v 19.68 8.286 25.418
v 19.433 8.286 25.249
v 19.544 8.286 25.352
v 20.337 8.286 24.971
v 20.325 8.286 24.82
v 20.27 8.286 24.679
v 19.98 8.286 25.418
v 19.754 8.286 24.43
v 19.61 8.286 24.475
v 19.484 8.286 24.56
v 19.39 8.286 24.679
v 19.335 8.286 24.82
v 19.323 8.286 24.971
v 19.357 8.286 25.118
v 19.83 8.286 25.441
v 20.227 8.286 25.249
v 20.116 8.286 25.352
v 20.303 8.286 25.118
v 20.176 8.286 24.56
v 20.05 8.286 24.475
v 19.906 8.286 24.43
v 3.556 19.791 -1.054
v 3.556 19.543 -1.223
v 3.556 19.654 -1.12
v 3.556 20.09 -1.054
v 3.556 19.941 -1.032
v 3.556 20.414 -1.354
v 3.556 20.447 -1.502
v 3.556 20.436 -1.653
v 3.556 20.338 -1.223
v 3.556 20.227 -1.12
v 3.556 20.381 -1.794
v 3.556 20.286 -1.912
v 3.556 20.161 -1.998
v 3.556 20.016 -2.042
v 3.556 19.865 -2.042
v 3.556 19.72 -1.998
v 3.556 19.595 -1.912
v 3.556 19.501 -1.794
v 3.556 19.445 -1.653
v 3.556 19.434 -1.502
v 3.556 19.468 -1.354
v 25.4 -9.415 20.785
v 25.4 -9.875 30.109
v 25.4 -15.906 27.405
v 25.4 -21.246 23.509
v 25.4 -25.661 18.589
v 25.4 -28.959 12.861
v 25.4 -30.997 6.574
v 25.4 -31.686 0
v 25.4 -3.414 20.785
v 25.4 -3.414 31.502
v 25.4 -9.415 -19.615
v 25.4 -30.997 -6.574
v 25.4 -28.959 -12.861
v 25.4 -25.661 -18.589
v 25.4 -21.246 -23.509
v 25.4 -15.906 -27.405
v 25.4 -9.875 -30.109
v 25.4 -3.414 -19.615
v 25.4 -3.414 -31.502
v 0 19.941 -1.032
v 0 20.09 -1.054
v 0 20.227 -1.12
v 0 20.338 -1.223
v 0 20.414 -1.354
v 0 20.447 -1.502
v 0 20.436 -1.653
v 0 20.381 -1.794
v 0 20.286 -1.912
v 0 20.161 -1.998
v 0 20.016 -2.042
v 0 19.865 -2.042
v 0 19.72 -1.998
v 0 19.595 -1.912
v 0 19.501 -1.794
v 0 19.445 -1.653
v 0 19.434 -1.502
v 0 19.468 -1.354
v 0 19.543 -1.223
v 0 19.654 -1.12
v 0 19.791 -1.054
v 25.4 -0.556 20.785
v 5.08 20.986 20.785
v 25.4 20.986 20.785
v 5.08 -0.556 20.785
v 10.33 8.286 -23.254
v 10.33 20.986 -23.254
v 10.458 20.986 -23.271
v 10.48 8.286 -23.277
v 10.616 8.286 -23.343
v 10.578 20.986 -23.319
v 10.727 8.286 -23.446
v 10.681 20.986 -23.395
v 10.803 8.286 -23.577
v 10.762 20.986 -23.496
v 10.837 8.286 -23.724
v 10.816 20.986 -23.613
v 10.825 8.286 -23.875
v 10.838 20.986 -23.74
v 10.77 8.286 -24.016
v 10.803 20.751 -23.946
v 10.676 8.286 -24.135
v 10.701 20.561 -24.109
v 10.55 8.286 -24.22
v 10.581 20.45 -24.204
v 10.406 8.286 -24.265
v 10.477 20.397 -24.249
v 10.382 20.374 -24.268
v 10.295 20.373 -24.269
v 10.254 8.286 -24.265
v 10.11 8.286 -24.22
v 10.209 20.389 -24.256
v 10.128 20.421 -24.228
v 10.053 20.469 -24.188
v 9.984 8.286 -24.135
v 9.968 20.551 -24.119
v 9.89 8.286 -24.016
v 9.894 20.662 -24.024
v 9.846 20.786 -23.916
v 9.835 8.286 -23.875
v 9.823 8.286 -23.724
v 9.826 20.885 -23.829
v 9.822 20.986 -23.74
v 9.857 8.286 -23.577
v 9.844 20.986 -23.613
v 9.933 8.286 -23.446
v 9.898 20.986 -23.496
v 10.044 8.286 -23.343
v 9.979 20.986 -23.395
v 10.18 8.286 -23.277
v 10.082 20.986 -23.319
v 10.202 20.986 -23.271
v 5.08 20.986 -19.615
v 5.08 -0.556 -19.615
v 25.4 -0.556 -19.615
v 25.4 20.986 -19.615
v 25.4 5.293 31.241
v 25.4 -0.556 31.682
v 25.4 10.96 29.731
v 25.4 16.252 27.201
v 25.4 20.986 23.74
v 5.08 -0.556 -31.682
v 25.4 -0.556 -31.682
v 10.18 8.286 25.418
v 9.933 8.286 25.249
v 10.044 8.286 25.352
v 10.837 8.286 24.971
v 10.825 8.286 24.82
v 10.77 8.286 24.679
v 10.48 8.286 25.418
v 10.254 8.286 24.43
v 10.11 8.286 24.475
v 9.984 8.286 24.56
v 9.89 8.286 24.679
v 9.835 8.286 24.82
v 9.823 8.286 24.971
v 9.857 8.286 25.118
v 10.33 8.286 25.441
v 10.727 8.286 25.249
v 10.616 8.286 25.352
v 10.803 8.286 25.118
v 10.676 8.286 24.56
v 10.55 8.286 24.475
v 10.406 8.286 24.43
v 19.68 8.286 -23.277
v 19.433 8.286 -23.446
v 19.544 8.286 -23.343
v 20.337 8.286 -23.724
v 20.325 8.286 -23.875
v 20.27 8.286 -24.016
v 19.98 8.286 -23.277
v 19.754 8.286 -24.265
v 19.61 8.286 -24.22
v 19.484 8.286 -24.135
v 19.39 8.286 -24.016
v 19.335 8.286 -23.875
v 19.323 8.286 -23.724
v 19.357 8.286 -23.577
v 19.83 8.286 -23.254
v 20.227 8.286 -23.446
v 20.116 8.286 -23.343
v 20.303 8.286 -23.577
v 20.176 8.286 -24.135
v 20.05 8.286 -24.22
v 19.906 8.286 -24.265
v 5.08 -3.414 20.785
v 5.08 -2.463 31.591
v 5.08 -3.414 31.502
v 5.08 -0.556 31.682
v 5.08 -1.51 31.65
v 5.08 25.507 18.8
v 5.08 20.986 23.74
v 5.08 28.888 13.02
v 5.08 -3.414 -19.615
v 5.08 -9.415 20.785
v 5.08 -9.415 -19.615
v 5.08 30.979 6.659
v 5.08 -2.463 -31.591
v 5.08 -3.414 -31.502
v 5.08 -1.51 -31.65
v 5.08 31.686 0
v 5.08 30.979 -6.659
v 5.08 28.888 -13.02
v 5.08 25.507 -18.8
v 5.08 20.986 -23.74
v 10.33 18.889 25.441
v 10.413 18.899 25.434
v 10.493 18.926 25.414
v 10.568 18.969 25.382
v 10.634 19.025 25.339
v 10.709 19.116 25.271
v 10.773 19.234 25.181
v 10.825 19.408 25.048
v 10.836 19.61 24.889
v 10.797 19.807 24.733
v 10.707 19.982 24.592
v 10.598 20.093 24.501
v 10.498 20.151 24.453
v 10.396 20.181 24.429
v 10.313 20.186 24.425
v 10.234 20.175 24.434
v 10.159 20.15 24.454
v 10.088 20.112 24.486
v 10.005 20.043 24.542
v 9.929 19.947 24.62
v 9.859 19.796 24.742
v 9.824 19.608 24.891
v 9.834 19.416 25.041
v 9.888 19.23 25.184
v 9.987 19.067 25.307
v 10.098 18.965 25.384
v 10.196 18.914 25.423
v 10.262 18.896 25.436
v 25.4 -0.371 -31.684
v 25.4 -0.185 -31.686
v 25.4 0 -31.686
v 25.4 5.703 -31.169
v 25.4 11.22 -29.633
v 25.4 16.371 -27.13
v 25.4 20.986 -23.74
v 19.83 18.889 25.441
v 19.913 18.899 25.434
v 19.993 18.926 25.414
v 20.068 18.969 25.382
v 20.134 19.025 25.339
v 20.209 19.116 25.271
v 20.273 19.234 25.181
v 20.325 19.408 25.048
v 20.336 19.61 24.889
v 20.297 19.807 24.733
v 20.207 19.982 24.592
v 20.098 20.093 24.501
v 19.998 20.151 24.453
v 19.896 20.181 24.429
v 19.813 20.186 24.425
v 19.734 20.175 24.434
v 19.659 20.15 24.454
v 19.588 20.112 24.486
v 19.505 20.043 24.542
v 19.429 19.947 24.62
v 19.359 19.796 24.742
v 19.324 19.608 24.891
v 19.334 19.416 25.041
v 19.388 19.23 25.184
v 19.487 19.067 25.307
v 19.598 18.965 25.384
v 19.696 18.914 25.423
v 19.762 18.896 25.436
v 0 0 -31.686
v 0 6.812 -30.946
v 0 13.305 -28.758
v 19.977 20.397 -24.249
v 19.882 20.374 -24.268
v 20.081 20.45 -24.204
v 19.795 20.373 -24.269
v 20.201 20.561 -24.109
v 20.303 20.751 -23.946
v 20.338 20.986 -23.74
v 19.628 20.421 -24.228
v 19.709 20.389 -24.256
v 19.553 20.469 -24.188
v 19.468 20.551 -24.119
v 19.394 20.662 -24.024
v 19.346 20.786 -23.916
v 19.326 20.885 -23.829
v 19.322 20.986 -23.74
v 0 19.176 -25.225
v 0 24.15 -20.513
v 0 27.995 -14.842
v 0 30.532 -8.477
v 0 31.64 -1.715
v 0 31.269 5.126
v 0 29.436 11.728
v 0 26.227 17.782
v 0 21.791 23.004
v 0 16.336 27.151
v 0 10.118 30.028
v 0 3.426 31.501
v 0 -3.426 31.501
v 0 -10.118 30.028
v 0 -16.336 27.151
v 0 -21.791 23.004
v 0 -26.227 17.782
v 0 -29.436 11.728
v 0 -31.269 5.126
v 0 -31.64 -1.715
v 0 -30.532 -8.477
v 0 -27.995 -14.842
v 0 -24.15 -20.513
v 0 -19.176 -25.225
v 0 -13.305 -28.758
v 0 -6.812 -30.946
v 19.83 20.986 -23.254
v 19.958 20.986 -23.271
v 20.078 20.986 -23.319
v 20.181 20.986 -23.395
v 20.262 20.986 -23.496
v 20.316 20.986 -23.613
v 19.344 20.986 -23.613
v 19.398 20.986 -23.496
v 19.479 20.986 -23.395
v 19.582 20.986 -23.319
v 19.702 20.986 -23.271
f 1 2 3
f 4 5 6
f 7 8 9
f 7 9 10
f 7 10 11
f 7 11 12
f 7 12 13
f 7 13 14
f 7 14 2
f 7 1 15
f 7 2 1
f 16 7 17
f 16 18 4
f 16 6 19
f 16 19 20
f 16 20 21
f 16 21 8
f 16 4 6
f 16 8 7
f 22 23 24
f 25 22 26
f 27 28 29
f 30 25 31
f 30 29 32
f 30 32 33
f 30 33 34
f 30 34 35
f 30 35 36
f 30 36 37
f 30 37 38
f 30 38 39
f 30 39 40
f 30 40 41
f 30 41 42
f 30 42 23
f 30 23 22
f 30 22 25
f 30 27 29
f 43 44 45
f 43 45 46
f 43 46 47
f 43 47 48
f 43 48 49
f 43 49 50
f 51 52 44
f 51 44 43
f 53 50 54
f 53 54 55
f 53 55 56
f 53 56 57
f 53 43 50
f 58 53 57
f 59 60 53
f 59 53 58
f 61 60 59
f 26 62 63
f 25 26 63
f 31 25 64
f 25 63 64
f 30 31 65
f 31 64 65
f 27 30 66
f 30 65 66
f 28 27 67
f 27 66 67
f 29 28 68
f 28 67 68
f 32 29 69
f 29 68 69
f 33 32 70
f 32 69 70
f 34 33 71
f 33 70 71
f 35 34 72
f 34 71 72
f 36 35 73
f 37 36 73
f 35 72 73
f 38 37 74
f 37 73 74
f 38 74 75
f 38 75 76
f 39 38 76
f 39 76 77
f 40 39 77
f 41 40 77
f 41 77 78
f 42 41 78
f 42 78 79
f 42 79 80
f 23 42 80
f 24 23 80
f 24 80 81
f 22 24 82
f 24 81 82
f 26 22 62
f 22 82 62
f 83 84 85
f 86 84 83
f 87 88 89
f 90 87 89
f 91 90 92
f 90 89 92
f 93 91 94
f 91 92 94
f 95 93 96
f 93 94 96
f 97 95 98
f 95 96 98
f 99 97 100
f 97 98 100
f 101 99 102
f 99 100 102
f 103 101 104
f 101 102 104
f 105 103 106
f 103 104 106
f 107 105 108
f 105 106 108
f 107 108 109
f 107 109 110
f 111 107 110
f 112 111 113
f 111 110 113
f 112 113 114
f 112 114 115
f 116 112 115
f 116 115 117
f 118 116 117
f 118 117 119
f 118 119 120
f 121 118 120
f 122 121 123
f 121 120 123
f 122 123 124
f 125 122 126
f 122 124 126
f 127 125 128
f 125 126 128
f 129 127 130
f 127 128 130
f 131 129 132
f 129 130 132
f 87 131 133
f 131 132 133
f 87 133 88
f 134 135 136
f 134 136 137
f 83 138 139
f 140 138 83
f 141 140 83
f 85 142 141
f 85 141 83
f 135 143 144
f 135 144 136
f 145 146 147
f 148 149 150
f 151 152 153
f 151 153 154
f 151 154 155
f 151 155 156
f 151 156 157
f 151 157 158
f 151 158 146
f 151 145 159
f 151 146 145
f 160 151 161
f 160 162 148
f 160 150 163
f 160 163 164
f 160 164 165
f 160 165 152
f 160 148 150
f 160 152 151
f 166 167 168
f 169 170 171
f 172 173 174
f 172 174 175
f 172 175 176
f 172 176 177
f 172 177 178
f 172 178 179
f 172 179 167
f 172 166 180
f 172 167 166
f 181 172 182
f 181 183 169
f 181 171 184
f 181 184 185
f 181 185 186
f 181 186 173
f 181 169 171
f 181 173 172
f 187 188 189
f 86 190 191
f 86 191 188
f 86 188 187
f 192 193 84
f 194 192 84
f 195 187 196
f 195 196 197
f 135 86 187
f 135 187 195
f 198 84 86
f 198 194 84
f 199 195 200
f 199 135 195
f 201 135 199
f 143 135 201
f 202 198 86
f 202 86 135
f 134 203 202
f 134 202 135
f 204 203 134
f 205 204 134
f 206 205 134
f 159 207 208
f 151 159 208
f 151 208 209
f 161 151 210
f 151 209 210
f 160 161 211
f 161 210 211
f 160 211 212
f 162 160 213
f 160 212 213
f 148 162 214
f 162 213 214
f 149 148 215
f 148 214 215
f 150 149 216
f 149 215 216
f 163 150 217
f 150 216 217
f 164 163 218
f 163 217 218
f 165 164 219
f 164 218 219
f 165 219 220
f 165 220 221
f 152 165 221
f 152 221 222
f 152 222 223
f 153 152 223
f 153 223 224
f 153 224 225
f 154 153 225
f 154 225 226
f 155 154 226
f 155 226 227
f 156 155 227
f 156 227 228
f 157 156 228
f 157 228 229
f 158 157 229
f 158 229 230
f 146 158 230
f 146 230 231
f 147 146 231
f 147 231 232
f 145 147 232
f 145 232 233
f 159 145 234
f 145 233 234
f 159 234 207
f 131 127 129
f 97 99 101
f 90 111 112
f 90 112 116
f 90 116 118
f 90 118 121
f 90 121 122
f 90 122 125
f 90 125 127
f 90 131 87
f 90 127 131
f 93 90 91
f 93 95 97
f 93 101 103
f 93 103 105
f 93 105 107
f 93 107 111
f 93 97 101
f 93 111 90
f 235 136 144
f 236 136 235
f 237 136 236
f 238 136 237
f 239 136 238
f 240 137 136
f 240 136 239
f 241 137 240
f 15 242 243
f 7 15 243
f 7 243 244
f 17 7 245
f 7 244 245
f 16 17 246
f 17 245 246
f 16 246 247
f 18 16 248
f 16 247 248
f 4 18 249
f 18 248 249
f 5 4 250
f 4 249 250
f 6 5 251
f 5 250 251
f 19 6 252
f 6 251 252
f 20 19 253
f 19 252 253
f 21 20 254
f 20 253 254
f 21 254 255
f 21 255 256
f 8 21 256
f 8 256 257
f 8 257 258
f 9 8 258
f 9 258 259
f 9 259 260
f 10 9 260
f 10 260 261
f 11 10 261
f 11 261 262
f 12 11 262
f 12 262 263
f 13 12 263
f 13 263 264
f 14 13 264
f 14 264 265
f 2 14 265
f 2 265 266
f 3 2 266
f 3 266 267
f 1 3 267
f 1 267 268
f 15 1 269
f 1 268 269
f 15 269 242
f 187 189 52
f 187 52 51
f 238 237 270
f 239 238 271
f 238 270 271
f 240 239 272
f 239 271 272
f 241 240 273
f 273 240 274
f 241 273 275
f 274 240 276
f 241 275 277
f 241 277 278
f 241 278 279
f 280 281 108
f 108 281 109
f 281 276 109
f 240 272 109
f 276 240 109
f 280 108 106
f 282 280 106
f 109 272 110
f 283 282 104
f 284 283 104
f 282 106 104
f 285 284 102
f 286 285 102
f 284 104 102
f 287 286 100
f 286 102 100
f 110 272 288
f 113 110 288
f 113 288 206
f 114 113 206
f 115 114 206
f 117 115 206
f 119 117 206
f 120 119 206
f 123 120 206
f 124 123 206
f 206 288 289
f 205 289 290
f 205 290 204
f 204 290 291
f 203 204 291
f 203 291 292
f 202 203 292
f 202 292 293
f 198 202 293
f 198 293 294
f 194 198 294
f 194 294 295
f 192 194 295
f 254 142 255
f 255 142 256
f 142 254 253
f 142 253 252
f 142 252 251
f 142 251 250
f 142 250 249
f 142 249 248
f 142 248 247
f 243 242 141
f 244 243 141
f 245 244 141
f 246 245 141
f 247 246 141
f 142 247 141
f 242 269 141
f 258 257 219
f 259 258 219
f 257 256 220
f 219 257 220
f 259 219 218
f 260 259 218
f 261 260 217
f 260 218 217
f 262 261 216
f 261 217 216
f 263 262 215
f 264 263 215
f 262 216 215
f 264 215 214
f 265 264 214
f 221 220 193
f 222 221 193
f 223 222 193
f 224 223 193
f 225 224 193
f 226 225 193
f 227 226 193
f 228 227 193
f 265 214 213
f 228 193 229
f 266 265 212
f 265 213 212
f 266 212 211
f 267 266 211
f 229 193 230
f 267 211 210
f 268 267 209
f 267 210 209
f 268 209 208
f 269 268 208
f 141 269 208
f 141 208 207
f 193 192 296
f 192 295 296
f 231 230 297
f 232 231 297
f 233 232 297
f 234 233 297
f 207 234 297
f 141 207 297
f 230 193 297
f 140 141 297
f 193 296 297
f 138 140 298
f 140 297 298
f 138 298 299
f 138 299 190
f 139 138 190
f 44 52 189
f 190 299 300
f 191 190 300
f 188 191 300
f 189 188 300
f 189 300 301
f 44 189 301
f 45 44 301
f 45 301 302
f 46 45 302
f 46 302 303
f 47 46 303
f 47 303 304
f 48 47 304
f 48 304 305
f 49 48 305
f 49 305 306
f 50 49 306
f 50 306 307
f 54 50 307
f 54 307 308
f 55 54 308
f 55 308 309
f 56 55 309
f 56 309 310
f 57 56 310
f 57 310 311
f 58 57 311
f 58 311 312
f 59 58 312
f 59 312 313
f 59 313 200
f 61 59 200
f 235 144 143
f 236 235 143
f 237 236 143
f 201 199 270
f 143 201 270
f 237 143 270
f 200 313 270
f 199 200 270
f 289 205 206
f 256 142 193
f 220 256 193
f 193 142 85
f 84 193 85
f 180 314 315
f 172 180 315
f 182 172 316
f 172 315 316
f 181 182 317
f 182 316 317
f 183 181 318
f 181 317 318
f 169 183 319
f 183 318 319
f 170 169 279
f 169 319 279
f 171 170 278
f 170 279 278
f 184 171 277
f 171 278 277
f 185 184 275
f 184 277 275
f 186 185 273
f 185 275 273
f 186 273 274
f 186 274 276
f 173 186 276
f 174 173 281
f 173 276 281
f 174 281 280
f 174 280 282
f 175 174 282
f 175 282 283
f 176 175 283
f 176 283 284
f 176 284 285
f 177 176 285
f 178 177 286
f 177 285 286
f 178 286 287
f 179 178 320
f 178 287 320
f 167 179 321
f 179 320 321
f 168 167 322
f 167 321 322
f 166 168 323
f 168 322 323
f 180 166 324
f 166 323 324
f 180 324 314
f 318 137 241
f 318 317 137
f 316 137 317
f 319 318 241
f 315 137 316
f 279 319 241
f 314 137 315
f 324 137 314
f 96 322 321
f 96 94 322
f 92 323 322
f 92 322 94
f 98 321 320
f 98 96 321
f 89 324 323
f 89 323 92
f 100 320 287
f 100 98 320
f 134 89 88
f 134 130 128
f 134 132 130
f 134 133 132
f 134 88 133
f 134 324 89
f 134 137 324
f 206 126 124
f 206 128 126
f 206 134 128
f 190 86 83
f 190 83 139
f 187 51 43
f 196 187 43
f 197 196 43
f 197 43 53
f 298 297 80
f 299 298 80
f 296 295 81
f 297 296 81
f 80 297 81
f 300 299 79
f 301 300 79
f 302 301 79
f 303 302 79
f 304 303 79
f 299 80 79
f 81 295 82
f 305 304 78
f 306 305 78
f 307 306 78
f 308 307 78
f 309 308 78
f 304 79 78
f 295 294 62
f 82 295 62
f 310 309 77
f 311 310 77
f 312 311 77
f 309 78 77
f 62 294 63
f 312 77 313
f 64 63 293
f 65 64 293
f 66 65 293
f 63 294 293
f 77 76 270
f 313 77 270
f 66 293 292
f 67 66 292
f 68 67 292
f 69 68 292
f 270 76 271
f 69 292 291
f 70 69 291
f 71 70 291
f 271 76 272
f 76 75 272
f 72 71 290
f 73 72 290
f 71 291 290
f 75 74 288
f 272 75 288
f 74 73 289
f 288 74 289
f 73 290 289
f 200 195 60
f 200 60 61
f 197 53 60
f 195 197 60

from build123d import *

# Parameters (mm, degrees)
SKETCH1_R           = 31.6865
BOSS_EXTRUDE1_DEPTH = 25.4
CUT_EXTRUDE1_START  = -20.32
CUT_EXTRUDE1_DEPTH  = 20.32
SKETCH5_R           = 0.508
CUT_EXTRUDE2_DEPTH  = 12.7
SKETCH6_R           = 0.508
CUT_EXTRUDE3_DEPTH  = 3.556


with BuildPart() as part:
    # Sketch1 → Boss-Extrude1 (new body)
    with BuildSketch(Plane(origin=(0, 0, 0), x_dir=(0, 0, -1), z_dir=(1, 0, 0))):
        Circle(SKETCH1_R)
    extrude(amount=BOSS_EXTRUDE1_DEPTH)

    # Sketch3 → Cut-Extrude1 (cut)
    with BuildSketch(Plane(origin=(25.4, 0, 0), x_dir=(0, 0, -1), z_dir=(1, 0, 0)).offset(CUT_EXTRUDE1_START)):
        with BuildLine():
            Line((-20.785135478, -0.556), (-31.681621585, -0.556))
            ThreePointArc((-31.681621585, -0.556), (-31.624152047, -1.986778691), (-31.50209993, -3.4135))
            Line((-31.50209993, -3.4135), (-20.785135478, -3.4135))
            Line((-20.785135478, -3.4135), (-20.785135478, -9.415012817))
            Line((-20.785135478, -9.415012817), (19.614864522, -9.415012817))
            Line((19.614864522, -9.415012817), (19.614864522, -3.4135))
            Line((19.614864522, -3.4135), (31.50209993, -3.4135))
            ThreePointArc((31.50209993, -3.4135), (31.624152047, -1.986778691), (31.681621585, -0.556))
            Line((31.681621585, -0.556), (19.614864522, -0.556))
            Line((19.614864522, -0.556), (19.614864522, 20.9865))
            Line((19.614864522, 20.9865), (23.740284329, 20.9865))
            ThreePointArc((23.740284329, 20.9865), (0, 31.6865), (-23.740284329, 20.9865))
            Line((-23.740284329, 20.9865), (-20.785135478, 20.9865))
            Line((-20.785135478, 20.9865), (-20.785135478, -0.556))
        make_face()
    extrude(amount=CUT_EXTRUDE1_DEPTH, mode=Mode.SUBTRACT)

    # Sketch5 → Cut-Extrude2 (cut)
    with BuildSketch(Plane(origin=(0, 20.9865, 0), x_dir=(1, 0, 0), z_dir=(0, 1, 0))):
        with Locations((10.33, -24.932573059)):
            Circle(SKETCH5_R)
        with Locations((19.83, -24.932573059)):
            Circle(SKETCH5_R)
        with Locations((10.33, 23.762302103)):
            Circle(SKETCH5_R)
        with Locations((19.83, 23.762302103)):
            Circle(SKETCH5_R)
    extrude(amount=-CUT_EXTRUDE2_DEPTH, mode=Mode.SUBTRACT)

    # Sketch6 → Cut-Extrude3 (cut)
    with BuildSketch(Plane.ZY):
        with Locations((-1.539927539, 19.940627452)):
            Circle(SKETCH6_R)
    extrude(amount=-CUT_EXTRUDE3_DEPTH, mode=Mode.SUBTRACT)


solid = part.part
